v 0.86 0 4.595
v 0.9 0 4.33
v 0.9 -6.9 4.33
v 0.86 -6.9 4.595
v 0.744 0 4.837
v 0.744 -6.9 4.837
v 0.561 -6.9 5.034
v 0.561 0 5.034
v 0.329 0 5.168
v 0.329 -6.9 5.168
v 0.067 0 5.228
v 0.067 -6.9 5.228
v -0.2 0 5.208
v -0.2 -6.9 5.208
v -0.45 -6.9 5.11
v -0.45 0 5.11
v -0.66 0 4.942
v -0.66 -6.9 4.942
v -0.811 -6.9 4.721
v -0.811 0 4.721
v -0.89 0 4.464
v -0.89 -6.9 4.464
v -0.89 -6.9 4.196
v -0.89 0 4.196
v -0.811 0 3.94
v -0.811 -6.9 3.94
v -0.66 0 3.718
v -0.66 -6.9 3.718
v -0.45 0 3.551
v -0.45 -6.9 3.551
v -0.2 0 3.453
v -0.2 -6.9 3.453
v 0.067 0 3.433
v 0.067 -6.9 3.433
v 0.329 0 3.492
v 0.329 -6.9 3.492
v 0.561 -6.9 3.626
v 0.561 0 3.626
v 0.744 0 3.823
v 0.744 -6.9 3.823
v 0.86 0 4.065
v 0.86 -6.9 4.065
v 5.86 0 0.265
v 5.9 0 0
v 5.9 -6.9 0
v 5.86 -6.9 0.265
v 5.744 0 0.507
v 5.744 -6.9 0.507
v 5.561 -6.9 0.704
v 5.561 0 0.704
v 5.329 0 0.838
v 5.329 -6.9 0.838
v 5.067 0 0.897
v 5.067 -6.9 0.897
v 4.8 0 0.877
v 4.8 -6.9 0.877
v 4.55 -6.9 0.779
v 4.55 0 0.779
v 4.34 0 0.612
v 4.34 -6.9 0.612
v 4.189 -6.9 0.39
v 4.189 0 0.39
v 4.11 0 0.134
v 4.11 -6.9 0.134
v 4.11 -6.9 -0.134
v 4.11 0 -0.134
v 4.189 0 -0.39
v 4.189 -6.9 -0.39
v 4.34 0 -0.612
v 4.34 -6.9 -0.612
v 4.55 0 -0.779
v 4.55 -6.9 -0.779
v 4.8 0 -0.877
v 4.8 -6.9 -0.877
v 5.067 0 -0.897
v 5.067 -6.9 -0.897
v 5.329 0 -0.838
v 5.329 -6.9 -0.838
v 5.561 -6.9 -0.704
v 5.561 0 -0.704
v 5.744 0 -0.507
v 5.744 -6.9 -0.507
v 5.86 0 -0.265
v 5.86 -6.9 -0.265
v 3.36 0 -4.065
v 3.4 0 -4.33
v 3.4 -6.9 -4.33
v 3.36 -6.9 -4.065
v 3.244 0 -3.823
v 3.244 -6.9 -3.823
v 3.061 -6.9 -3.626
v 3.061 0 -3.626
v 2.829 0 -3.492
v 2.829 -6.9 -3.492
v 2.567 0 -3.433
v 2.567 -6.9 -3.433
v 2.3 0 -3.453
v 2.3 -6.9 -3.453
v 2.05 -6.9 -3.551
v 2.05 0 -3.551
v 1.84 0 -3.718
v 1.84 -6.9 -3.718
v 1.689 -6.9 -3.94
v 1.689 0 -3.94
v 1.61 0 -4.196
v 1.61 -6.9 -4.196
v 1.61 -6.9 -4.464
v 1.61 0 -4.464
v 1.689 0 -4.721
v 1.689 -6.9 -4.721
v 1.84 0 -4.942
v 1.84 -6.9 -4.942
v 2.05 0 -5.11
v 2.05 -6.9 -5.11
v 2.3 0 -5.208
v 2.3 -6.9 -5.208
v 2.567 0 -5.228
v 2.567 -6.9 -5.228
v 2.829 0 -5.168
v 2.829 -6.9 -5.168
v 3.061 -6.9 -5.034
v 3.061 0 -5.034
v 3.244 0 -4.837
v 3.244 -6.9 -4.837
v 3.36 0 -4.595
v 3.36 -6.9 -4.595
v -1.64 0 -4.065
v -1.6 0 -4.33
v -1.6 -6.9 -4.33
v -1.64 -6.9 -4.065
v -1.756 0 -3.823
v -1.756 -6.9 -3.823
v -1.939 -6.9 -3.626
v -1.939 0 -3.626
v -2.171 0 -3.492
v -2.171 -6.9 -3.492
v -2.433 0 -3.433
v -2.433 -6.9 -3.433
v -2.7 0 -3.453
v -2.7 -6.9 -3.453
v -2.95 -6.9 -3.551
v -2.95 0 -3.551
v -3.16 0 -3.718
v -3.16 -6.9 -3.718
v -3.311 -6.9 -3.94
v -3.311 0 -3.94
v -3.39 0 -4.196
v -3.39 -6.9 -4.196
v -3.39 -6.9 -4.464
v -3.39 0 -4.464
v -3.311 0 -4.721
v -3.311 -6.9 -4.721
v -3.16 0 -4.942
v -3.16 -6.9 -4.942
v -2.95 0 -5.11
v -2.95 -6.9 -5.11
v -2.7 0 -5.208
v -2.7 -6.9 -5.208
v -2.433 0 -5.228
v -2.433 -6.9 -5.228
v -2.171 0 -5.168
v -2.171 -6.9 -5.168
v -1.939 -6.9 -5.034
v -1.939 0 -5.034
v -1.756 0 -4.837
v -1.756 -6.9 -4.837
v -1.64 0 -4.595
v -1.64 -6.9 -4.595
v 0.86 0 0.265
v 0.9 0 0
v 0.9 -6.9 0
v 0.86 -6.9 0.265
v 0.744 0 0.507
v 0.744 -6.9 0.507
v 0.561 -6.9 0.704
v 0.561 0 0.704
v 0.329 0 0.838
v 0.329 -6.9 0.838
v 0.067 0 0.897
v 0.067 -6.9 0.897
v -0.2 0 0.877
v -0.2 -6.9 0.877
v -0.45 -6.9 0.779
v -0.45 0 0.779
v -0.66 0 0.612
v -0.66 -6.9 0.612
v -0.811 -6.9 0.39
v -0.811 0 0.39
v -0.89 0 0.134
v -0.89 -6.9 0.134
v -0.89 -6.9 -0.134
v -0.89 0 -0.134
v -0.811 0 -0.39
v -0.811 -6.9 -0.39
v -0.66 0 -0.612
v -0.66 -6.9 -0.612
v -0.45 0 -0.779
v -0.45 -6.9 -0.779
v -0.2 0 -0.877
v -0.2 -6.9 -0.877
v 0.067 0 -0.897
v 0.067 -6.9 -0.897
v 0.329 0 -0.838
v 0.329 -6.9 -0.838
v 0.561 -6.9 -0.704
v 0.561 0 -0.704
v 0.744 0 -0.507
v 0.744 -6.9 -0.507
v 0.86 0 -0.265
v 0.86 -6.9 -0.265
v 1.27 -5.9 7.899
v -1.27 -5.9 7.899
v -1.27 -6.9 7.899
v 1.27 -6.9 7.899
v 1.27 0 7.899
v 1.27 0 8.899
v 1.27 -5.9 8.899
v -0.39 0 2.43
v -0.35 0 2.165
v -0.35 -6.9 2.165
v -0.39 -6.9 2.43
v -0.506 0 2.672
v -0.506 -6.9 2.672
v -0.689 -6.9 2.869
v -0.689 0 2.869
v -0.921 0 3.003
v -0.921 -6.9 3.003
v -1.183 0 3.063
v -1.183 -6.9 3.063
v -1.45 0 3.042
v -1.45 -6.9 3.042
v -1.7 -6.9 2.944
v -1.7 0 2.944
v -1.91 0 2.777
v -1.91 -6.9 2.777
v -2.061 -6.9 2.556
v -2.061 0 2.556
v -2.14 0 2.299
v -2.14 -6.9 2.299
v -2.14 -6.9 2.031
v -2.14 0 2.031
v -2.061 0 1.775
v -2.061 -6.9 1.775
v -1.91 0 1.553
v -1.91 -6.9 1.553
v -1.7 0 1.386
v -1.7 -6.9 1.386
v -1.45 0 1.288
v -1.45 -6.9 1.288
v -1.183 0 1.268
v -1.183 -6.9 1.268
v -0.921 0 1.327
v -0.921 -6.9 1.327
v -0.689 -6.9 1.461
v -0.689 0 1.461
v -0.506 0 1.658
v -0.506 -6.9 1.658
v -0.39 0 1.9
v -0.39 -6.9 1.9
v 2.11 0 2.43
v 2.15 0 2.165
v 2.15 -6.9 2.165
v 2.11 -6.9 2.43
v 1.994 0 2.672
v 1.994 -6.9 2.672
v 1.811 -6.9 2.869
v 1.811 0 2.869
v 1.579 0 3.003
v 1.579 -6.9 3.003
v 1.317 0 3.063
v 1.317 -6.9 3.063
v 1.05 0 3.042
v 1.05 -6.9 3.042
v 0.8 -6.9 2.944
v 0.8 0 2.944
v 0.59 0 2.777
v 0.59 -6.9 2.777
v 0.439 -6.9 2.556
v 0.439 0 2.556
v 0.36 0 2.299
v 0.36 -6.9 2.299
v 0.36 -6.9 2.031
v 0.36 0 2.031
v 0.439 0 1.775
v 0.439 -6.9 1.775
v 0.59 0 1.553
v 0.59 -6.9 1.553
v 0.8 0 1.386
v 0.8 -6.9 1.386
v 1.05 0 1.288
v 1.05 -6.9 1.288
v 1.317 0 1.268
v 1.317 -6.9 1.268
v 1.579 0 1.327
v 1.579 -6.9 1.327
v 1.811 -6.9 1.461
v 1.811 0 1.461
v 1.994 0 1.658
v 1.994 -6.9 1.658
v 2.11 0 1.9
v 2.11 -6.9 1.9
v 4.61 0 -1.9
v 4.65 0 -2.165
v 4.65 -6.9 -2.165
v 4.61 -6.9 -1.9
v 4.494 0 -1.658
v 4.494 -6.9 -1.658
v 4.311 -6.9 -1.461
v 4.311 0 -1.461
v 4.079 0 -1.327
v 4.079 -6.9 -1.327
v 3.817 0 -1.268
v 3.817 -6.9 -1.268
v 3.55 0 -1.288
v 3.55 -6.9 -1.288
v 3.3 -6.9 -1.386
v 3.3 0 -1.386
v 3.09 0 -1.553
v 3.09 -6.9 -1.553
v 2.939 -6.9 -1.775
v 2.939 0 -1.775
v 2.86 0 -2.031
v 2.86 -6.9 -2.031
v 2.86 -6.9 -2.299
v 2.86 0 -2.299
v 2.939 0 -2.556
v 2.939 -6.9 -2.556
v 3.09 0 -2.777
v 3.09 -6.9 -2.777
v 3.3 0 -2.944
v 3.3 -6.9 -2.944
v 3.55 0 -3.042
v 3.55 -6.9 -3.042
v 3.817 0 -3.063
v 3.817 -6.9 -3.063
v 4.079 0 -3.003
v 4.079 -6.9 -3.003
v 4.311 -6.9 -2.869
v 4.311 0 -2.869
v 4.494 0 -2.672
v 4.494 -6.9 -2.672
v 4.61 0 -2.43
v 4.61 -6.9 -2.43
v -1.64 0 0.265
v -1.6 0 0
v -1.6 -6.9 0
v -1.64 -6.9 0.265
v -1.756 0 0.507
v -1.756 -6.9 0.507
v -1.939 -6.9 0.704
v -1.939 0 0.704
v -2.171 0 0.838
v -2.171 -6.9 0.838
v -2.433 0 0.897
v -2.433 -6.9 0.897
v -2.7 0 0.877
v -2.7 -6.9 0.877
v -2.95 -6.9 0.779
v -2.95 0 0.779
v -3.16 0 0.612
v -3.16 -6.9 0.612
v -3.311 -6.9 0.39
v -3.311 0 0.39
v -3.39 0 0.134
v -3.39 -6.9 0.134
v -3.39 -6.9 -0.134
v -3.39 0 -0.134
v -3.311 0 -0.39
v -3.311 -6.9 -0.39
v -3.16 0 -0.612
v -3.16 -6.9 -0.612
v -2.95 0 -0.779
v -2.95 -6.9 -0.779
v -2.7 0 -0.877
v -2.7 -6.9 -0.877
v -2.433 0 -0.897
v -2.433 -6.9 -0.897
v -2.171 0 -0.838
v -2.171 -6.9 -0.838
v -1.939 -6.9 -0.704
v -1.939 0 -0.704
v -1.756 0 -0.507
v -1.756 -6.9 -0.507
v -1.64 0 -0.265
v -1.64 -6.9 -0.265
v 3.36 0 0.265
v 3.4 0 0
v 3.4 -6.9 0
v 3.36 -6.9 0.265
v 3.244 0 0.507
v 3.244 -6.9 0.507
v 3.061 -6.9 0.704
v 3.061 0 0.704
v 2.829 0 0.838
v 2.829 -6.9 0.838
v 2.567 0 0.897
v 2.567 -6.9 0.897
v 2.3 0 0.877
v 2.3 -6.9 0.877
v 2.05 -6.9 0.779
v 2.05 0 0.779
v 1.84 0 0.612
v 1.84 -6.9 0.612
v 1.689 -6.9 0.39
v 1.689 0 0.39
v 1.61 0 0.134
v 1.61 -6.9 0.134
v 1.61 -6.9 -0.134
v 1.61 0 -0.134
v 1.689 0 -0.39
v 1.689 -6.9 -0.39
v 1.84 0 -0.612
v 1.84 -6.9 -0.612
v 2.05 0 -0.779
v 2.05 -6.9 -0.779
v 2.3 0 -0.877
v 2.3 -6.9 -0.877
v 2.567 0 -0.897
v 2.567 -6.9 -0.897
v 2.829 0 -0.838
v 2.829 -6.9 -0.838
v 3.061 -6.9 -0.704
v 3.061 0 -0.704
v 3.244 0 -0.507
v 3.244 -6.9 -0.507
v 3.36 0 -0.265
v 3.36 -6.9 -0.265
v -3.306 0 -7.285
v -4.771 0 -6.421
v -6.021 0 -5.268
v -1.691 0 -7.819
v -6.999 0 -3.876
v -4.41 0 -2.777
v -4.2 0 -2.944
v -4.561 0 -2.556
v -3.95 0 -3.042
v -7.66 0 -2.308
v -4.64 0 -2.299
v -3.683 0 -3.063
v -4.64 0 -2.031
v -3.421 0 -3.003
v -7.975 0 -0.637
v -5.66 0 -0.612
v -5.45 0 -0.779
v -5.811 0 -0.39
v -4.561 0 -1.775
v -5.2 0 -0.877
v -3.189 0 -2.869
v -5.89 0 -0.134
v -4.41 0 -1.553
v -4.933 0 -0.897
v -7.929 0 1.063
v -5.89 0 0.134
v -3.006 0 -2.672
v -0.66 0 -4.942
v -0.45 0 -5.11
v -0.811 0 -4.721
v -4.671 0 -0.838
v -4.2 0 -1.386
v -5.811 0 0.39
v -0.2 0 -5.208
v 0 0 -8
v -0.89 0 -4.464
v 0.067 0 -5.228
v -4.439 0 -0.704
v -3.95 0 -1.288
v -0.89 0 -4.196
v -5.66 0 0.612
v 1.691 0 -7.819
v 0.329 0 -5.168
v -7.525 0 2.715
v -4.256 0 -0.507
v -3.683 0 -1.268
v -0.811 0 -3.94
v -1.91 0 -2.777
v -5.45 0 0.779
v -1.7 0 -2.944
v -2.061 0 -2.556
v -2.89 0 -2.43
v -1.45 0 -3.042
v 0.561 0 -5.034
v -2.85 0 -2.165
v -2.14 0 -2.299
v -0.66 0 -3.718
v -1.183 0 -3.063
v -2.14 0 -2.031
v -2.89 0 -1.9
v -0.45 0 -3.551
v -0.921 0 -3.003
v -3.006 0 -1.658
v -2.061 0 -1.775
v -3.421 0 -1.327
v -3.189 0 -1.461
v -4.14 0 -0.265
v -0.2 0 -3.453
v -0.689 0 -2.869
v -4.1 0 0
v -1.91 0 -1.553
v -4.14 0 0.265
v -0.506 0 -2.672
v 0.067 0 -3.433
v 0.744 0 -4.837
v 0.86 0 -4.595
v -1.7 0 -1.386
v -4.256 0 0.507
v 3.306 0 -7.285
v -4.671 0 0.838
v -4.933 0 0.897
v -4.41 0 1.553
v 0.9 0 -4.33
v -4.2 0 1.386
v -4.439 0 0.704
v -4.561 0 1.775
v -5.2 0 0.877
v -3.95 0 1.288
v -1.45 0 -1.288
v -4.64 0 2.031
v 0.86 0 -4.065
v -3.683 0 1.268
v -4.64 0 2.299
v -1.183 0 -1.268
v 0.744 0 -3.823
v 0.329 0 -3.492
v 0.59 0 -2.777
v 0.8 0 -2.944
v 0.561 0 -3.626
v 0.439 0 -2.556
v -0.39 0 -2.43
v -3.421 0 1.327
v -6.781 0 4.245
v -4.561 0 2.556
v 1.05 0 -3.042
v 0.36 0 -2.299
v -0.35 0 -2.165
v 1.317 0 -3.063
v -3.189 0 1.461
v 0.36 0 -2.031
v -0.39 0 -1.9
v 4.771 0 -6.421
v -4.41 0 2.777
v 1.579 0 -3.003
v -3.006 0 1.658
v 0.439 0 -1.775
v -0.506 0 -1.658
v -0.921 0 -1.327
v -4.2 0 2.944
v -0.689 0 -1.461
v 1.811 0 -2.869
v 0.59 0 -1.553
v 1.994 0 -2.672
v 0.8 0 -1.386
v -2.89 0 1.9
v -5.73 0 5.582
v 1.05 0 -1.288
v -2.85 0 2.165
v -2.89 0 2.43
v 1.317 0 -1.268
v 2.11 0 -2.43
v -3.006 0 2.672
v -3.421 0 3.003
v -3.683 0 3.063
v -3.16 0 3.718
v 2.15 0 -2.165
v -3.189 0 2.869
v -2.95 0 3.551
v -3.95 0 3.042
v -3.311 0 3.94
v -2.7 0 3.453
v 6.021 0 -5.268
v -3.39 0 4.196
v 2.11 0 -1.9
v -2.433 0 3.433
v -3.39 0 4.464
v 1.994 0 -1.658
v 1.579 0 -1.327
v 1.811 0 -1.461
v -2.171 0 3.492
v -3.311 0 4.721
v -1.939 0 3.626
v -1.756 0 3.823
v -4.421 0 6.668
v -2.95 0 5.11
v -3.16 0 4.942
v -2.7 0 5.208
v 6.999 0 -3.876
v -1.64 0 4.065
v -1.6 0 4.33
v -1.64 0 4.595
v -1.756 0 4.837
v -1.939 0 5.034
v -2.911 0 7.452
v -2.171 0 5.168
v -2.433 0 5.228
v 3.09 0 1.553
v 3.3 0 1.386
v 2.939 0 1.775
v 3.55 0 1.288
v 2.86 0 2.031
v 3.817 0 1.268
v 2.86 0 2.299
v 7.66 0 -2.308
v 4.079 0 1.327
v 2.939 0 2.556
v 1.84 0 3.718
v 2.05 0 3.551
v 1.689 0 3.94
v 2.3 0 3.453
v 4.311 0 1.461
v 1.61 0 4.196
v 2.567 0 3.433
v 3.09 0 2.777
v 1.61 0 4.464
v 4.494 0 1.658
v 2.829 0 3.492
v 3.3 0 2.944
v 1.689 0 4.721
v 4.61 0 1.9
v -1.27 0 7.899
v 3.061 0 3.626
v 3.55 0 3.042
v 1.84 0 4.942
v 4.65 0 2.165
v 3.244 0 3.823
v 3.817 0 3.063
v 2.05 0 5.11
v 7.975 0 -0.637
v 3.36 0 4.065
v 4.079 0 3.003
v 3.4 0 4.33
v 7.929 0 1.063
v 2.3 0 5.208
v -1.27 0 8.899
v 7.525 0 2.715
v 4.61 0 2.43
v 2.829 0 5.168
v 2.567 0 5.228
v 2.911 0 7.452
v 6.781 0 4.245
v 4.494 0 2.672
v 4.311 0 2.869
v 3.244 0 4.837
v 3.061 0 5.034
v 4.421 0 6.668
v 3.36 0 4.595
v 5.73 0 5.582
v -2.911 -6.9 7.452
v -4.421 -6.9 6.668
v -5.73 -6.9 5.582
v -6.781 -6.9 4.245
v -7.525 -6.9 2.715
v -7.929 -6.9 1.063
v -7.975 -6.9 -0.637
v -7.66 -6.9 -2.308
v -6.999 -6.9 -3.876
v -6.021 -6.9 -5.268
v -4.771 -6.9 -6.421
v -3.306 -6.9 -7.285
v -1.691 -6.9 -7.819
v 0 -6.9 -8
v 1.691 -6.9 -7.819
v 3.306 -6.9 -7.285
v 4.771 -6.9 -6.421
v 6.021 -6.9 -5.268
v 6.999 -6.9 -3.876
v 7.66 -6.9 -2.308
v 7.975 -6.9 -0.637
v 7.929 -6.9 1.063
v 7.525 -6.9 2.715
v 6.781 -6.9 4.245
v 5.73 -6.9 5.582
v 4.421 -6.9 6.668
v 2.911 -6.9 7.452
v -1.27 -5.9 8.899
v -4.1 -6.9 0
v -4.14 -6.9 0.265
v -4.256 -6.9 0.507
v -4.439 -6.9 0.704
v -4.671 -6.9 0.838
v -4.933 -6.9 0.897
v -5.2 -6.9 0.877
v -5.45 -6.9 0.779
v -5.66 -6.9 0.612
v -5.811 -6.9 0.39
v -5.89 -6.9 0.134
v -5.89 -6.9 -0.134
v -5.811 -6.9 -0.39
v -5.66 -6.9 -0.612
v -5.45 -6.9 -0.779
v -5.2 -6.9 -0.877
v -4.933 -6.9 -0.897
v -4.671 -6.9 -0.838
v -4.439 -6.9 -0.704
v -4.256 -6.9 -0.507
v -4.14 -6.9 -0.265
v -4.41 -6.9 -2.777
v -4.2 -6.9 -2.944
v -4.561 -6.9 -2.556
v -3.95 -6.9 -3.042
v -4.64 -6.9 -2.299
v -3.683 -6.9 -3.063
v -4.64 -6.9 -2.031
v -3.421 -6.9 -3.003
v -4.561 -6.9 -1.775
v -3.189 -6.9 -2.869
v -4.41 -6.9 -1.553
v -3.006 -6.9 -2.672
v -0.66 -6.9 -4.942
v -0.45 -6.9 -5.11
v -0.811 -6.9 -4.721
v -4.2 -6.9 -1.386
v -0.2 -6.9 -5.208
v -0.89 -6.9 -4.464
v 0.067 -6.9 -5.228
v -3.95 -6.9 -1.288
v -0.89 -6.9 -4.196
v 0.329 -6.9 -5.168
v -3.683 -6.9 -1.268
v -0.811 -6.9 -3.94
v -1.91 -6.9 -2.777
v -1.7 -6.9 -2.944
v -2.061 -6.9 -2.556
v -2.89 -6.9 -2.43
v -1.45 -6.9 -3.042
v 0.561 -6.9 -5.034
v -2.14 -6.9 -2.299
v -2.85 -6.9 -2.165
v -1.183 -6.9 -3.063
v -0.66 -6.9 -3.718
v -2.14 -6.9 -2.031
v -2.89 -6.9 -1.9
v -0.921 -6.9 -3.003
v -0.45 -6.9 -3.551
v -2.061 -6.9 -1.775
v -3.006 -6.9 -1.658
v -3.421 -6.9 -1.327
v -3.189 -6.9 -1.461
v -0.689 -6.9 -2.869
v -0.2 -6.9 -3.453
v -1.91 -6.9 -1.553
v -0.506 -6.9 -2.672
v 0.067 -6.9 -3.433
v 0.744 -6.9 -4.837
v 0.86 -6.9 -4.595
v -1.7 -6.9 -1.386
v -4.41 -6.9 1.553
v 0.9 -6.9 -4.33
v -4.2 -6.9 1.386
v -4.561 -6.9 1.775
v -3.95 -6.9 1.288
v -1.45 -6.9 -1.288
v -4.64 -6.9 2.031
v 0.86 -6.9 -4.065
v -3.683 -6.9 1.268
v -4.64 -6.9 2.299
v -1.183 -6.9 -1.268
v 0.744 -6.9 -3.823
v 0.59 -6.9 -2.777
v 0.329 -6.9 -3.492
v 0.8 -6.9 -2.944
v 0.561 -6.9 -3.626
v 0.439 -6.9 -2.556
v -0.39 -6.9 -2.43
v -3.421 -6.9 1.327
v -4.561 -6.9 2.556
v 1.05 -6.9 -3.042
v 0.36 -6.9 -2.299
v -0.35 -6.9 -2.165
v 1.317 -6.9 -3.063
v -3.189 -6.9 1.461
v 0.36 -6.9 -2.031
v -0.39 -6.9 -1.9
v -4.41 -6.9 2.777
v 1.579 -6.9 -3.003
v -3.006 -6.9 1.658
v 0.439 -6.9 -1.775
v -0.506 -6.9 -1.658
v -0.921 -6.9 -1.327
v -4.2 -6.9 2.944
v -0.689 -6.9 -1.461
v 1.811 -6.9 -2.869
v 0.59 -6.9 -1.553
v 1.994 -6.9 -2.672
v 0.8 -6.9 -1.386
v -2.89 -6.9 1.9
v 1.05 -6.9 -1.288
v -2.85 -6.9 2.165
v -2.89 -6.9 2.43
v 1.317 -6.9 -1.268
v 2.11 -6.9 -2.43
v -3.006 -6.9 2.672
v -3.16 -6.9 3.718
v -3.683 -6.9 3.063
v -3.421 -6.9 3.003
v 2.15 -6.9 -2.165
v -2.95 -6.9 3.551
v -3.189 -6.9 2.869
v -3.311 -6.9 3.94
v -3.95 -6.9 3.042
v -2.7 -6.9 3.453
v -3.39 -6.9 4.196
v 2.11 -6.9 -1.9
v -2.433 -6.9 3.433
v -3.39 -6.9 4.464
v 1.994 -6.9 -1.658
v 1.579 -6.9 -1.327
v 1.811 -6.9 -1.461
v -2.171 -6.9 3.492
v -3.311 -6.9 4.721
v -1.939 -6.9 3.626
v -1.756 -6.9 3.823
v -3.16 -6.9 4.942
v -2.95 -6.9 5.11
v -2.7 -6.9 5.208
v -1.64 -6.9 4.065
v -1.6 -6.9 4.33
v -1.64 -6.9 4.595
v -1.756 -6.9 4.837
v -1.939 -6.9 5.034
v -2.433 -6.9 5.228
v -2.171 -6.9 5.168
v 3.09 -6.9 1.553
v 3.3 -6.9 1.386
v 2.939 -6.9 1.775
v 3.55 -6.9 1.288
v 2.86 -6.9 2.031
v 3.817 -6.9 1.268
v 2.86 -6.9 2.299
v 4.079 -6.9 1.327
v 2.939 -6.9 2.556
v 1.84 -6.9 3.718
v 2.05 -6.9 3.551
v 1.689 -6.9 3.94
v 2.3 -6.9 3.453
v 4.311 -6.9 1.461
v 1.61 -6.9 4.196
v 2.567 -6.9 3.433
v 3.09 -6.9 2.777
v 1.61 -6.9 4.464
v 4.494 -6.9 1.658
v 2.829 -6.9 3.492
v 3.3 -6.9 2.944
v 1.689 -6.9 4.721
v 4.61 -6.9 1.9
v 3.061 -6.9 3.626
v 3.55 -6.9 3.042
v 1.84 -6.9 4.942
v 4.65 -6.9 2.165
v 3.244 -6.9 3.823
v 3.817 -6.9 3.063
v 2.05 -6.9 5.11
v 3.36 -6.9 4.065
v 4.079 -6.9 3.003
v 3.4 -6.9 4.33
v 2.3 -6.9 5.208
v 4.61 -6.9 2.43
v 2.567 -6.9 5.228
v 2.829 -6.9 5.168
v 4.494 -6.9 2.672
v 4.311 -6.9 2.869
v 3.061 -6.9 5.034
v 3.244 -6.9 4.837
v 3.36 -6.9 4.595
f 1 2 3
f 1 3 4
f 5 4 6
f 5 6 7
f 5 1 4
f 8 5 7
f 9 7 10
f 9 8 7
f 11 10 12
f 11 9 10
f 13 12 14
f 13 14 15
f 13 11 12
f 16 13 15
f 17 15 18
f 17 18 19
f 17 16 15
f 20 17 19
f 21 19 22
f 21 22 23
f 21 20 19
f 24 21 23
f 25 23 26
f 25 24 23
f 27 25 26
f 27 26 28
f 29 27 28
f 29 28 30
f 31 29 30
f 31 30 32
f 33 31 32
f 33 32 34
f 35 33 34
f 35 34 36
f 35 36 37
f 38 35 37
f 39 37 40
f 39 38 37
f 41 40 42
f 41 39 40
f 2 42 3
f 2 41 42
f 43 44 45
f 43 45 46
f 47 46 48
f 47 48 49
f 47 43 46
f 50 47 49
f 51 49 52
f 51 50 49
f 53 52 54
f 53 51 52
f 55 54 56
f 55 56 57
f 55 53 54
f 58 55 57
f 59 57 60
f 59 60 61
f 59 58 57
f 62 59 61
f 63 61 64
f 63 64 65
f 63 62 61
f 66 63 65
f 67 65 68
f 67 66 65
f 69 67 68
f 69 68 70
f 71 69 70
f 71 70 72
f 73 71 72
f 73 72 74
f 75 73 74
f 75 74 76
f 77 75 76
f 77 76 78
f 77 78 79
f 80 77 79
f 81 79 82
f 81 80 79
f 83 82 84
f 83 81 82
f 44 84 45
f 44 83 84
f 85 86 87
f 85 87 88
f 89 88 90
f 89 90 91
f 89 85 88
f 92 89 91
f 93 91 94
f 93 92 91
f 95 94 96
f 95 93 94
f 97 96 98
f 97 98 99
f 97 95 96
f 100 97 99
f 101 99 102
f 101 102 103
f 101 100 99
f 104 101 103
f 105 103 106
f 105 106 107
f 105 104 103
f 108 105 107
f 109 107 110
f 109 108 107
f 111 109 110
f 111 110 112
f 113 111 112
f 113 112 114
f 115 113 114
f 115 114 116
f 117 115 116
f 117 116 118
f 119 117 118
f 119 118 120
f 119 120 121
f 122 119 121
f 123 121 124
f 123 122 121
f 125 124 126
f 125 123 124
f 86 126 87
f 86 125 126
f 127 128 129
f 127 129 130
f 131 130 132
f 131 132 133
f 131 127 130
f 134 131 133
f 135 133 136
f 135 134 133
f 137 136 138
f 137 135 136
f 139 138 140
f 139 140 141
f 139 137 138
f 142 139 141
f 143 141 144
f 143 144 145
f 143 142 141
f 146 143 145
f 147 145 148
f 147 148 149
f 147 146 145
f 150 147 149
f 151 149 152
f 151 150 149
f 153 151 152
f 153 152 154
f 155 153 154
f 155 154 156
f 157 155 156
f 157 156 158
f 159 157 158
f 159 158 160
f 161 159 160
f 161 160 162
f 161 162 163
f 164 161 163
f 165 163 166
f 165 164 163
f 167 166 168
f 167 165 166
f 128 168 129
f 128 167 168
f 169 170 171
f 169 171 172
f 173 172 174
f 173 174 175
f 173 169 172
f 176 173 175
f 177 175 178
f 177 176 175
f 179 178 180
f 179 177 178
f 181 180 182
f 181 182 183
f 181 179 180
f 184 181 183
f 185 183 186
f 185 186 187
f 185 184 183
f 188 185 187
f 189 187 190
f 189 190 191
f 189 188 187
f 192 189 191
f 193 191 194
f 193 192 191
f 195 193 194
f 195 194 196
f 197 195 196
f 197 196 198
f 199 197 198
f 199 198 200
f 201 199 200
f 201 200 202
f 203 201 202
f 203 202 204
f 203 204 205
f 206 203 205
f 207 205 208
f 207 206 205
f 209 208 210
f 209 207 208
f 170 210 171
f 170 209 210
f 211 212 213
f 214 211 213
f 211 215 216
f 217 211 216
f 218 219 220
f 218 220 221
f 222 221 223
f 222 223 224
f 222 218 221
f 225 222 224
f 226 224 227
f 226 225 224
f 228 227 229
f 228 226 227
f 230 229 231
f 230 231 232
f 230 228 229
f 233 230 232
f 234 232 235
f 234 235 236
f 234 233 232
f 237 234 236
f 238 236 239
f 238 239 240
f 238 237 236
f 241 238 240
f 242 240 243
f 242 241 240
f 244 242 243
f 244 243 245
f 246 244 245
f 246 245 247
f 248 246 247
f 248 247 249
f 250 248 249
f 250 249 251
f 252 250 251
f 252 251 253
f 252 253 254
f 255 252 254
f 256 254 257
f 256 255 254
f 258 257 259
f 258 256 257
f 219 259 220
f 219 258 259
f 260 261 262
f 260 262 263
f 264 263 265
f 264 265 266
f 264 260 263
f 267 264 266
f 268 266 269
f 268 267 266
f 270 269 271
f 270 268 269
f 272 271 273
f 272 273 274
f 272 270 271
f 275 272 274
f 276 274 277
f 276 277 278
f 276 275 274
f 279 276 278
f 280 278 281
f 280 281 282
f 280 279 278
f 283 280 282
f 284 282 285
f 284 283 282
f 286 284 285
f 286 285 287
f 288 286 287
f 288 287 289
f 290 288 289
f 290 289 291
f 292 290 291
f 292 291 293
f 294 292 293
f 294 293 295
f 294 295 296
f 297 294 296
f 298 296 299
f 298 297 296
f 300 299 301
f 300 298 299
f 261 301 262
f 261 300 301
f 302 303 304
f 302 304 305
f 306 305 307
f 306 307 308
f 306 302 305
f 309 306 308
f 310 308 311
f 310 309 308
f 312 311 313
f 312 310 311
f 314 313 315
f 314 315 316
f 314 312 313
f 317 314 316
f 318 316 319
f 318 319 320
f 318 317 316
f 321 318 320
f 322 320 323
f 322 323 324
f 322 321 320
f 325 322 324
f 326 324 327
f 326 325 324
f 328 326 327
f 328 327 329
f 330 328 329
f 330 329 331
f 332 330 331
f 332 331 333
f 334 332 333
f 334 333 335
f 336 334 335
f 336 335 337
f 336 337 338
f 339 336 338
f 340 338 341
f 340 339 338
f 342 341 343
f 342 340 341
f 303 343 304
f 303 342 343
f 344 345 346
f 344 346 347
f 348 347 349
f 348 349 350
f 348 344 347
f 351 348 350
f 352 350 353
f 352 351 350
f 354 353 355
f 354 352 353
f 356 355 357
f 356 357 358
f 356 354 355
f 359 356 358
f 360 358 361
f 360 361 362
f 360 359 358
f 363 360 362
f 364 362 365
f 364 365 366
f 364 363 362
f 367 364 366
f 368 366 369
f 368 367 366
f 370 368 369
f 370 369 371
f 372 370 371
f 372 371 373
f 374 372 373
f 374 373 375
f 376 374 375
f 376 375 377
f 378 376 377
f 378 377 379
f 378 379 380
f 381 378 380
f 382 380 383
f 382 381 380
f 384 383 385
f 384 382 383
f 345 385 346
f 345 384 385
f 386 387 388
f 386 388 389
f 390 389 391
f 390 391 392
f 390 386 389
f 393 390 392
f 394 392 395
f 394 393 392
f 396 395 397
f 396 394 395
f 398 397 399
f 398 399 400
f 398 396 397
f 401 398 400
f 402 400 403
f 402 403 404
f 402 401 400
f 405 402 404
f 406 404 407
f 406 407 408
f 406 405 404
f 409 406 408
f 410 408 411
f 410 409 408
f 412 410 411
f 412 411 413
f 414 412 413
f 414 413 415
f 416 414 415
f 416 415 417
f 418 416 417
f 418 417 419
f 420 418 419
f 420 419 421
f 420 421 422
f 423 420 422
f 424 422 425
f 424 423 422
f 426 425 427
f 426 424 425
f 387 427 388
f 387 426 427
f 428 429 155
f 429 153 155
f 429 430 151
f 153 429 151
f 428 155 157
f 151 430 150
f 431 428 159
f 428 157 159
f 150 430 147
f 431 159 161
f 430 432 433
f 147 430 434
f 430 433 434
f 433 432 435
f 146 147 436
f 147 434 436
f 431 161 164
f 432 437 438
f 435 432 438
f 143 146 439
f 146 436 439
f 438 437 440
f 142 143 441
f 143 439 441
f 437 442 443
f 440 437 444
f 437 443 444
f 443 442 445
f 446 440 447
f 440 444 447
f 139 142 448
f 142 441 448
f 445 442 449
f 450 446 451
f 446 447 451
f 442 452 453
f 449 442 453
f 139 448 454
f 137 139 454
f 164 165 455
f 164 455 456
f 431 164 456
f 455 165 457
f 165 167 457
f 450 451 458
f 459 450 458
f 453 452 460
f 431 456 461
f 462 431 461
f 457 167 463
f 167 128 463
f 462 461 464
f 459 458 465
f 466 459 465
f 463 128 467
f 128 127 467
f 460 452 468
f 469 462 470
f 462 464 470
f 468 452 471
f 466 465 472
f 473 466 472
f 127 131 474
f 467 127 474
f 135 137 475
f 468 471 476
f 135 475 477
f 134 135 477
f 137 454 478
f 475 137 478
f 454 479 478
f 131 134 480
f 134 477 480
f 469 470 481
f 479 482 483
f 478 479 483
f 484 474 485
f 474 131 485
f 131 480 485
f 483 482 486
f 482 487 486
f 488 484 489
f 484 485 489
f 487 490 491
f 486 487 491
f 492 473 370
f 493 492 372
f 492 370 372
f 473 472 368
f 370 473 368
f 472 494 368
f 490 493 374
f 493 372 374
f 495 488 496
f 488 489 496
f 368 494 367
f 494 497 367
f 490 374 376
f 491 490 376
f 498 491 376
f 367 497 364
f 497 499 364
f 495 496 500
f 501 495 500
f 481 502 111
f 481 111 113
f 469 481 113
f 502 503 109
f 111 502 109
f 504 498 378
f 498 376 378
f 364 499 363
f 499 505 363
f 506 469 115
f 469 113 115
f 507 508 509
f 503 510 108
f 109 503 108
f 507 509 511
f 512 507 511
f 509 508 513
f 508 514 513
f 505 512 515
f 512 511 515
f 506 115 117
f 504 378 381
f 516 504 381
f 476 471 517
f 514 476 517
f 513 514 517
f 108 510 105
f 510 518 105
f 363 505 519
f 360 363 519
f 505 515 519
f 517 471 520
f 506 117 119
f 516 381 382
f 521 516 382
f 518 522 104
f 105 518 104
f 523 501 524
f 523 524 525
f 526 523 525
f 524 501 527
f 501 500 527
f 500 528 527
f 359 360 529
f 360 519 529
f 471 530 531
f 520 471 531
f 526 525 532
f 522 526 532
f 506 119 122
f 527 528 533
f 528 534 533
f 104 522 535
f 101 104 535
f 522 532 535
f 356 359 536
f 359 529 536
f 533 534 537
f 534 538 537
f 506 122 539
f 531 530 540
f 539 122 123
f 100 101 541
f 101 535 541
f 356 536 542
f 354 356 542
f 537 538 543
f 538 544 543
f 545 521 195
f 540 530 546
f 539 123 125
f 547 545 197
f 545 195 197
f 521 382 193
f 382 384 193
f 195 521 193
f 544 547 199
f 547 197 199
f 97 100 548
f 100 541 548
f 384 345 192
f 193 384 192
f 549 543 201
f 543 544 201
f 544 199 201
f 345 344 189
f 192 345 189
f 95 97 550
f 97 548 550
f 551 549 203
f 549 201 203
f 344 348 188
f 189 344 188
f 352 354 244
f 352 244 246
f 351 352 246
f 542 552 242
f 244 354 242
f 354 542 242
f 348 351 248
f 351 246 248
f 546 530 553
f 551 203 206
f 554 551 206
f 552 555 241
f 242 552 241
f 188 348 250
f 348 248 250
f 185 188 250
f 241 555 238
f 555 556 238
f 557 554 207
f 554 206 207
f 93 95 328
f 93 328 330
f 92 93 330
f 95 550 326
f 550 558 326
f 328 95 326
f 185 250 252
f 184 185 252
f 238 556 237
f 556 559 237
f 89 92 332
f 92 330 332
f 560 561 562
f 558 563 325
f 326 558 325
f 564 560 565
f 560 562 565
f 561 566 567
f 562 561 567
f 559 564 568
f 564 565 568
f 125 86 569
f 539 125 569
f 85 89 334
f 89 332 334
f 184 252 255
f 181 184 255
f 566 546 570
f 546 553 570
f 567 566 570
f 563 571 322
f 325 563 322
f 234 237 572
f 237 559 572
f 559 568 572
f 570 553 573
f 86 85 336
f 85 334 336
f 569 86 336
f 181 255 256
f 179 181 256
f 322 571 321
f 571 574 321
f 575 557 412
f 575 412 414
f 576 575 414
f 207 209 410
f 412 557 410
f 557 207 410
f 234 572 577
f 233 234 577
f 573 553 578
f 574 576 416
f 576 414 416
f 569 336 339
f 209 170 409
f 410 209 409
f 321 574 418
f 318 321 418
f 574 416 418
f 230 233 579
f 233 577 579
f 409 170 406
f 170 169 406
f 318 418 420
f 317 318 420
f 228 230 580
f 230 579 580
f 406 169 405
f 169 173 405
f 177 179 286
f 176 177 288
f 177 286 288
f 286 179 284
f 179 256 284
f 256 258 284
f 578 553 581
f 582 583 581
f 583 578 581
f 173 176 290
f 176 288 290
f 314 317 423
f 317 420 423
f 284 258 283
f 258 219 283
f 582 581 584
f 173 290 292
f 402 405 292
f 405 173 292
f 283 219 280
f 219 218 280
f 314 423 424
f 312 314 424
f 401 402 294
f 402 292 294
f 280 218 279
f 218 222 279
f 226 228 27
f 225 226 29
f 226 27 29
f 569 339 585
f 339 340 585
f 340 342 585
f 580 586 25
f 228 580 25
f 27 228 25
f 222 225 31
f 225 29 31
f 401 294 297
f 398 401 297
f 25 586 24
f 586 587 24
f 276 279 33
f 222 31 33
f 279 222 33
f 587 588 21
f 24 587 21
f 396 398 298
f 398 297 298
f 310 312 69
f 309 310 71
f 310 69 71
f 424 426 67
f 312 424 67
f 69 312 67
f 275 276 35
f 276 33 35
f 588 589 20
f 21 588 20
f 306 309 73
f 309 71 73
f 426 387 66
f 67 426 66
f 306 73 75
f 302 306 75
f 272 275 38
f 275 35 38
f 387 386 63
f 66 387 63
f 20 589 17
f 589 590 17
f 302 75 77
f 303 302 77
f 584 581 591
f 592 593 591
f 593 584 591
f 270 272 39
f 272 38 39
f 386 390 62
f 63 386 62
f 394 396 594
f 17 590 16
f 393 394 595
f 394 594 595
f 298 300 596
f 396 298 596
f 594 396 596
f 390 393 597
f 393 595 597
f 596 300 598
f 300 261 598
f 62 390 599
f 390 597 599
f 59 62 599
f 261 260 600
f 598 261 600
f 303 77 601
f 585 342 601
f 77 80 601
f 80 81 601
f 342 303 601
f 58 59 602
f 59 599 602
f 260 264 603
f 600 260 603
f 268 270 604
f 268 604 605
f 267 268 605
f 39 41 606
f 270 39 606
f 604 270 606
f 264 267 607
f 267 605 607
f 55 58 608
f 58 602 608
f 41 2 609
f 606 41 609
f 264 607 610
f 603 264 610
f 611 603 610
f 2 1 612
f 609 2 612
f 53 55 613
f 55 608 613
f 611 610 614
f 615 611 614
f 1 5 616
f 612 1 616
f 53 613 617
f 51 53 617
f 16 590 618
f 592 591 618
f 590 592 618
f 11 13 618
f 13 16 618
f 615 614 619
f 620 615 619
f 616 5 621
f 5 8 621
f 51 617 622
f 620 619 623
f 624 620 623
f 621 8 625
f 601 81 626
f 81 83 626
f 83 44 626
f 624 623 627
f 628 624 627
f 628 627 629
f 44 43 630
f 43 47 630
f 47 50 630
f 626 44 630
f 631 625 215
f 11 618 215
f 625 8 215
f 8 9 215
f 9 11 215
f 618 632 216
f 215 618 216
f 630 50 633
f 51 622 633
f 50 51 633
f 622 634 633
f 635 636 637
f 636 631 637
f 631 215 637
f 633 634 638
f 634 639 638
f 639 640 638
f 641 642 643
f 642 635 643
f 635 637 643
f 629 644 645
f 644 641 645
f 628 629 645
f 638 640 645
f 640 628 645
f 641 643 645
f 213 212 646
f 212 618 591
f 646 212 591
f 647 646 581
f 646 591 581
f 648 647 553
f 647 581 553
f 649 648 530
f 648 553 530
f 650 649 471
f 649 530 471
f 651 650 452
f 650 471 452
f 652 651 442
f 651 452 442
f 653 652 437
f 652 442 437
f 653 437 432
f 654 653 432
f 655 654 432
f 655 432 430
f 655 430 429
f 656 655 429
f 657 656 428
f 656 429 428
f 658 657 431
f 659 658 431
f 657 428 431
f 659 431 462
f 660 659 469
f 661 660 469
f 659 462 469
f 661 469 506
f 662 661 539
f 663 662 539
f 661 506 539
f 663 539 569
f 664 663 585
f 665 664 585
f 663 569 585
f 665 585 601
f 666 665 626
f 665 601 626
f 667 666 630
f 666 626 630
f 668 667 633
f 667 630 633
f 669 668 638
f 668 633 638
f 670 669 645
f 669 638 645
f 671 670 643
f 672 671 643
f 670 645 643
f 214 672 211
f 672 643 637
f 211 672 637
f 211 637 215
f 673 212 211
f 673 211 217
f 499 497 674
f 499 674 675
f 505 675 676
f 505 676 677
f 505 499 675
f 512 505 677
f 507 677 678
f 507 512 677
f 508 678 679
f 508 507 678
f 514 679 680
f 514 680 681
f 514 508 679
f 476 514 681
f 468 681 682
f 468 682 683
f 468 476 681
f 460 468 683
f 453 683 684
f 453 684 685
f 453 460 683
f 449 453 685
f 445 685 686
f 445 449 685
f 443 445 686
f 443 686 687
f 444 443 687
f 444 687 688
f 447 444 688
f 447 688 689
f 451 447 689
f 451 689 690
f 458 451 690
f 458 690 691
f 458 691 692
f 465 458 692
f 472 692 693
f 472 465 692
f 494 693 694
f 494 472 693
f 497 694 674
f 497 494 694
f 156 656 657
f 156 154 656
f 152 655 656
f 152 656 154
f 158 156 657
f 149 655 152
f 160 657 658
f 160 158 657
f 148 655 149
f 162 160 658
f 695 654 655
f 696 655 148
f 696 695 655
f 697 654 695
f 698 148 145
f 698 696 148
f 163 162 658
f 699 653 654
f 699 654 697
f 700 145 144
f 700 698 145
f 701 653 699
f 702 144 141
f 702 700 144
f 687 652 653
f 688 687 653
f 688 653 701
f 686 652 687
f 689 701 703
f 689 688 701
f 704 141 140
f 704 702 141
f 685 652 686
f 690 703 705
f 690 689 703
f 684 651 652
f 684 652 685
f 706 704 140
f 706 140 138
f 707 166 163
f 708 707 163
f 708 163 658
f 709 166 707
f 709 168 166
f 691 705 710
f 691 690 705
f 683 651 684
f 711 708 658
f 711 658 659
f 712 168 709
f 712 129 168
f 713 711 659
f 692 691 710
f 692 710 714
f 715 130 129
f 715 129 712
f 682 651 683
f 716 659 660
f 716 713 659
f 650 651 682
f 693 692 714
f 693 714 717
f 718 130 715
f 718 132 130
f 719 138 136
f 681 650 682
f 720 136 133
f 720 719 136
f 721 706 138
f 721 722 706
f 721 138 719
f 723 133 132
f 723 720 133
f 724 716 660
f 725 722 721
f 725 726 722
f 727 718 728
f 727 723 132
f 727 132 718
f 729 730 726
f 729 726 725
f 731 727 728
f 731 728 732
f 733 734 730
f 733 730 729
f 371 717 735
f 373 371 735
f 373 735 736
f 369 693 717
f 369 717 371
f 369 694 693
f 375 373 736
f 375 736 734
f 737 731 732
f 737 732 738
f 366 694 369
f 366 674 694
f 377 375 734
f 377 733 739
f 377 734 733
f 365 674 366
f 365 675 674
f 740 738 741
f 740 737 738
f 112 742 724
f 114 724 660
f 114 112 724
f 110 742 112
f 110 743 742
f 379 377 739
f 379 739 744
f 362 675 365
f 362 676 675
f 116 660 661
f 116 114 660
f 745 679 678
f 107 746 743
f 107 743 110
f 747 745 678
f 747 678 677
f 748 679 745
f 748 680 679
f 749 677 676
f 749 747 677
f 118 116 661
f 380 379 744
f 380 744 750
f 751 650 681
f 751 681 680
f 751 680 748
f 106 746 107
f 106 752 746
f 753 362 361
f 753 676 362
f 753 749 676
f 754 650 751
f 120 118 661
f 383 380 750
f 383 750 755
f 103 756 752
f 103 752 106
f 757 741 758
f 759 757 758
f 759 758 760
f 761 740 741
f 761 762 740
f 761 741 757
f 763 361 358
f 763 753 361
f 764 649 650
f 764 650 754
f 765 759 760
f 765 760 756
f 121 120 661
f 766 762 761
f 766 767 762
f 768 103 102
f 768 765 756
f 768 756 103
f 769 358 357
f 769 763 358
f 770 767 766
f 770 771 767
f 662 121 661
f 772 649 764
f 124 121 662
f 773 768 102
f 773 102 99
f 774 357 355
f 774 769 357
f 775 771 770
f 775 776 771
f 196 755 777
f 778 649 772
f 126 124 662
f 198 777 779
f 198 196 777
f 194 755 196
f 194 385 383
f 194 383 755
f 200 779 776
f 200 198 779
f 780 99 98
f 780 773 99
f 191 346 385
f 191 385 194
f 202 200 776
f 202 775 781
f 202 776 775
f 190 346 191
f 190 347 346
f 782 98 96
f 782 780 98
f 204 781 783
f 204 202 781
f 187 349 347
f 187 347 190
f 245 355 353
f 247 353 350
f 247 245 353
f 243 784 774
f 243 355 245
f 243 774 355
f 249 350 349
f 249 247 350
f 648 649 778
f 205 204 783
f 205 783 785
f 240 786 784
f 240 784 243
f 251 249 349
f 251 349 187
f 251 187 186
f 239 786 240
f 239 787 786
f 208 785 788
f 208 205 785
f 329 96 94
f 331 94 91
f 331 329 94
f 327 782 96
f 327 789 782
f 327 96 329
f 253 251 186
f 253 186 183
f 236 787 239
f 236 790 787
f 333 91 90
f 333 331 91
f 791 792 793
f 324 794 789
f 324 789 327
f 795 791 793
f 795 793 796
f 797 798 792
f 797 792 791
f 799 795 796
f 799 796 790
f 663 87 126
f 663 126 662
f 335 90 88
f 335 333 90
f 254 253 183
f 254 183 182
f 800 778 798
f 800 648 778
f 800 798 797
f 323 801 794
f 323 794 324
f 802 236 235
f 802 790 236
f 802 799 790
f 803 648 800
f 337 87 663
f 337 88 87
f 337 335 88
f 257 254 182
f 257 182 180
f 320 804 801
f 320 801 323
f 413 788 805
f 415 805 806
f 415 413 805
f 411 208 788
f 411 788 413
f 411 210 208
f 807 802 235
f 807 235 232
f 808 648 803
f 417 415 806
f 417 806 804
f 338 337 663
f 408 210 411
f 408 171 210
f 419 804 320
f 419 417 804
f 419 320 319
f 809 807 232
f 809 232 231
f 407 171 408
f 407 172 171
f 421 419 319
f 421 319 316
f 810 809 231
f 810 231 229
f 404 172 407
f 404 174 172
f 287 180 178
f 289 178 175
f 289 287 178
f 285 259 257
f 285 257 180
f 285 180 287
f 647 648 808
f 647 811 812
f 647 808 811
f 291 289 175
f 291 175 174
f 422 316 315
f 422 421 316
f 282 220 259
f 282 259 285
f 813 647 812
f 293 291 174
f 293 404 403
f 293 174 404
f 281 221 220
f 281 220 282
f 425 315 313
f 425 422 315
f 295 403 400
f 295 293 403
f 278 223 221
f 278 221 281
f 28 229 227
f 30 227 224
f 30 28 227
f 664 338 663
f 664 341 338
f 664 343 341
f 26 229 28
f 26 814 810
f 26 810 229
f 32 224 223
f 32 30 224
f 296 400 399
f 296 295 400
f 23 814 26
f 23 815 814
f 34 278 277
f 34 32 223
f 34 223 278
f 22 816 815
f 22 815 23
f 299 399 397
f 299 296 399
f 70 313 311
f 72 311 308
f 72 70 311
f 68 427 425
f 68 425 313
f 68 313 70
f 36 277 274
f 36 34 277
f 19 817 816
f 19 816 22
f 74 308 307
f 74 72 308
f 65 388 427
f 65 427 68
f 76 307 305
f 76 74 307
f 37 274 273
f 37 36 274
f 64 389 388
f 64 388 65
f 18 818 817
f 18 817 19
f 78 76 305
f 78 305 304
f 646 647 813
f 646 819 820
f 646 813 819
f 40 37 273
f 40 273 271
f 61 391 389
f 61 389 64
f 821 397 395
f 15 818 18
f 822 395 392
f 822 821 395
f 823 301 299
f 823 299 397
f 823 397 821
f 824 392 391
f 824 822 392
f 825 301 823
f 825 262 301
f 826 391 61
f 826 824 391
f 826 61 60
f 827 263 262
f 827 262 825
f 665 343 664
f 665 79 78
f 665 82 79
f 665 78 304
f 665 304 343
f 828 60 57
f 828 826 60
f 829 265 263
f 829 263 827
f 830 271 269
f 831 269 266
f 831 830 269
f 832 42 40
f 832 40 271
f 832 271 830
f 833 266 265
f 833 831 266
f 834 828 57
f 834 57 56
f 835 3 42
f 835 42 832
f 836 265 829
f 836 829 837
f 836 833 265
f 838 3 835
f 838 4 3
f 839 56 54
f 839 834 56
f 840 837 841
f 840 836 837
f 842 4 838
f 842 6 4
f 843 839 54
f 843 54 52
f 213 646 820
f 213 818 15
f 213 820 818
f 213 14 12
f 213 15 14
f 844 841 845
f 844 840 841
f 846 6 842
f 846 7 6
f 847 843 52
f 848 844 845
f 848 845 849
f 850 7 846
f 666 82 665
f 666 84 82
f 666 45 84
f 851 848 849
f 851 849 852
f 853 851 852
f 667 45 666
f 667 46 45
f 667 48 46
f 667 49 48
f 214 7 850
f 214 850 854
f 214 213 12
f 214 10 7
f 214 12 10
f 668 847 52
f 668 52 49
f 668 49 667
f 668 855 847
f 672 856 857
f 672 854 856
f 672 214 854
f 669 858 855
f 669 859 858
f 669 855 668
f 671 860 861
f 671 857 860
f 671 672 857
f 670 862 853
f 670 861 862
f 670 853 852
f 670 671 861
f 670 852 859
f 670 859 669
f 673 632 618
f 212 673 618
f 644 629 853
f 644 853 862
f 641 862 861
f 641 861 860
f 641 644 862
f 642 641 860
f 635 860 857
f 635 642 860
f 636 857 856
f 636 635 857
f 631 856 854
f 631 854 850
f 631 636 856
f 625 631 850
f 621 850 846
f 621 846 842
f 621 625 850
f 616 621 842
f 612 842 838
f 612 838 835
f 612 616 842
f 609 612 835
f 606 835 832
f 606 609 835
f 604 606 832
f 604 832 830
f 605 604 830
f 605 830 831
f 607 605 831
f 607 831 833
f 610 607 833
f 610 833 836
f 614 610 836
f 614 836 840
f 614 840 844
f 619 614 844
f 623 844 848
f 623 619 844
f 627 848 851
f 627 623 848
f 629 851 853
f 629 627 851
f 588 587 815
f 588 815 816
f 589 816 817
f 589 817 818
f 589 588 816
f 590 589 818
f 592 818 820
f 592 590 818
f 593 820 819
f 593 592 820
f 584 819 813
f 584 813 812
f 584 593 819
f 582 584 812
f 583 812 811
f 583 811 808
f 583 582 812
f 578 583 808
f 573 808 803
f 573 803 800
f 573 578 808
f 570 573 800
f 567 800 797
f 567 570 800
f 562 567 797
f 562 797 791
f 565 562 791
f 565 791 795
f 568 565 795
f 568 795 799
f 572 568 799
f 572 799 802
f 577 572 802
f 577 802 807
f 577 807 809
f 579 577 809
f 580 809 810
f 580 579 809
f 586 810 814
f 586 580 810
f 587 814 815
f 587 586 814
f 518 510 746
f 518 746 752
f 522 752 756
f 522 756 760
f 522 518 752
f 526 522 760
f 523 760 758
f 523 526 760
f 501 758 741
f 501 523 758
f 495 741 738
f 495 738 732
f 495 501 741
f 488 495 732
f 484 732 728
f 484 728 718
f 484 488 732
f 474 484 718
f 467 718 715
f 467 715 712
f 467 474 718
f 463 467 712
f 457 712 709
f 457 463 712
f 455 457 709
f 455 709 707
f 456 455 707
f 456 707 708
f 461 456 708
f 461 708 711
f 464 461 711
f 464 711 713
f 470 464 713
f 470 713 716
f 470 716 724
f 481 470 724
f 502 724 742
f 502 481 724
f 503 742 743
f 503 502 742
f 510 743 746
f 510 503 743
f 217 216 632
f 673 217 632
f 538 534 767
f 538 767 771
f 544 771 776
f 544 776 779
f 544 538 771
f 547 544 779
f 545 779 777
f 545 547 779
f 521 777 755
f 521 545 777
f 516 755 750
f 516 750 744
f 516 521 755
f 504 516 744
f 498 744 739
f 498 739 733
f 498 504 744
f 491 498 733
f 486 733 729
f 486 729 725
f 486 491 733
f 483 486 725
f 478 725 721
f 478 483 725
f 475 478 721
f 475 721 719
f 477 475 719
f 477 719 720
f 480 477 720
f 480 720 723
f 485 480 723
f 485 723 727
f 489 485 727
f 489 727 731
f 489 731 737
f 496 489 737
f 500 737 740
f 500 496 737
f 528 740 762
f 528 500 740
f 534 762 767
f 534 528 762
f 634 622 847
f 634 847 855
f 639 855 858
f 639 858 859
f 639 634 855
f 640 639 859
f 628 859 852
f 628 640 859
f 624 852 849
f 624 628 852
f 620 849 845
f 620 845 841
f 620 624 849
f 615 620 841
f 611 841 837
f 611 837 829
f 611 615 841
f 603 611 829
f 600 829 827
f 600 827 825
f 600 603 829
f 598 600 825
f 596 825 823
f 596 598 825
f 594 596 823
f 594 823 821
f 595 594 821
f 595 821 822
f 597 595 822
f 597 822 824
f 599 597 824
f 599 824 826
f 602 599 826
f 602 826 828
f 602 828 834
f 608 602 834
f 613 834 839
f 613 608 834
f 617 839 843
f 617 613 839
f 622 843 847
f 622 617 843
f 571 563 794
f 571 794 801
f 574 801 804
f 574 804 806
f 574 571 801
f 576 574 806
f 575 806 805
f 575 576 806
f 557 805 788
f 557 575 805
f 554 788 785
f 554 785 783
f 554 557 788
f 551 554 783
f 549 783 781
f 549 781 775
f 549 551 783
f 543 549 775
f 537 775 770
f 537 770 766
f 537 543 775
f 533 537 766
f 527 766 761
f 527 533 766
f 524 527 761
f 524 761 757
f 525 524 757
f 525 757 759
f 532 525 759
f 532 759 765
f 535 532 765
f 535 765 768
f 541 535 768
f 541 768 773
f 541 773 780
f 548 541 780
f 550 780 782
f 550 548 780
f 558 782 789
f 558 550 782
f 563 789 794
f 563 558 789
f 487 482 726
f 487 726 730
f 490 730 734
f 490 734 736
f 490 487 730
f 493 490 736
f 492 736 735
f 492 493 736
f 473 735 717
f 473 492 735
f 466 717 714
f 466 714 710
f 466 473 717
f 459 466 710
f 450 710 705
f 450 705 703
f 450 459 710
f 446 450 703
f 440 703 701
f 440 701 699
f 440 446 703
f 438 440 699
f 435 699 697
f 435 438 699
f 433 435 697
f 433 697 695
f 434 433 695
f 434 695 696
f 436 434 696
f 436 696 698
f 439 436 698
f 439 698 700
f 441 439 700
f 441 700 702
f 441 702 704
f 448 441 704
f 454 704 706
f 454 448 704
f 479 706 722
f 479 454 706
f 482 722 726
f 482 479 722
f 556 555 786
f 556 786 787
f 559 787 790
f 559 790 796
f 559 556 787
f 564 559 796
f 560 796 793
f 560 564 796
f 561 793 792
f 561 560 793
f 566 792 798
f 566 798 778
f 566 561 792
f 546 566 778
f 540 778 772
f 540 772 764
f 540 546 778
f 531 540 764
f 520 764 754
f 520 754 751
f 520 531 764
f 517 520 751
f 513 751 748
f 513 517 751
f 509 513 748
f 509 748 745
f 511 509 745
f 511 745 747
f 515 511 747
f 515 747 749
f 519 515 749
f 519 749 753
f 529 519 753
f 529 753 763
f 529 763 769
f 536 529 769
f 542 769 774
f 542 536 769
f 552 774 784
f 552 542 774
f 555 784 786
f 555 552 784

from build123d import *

# Parameters (mm, degrees)
F0_R     = 0.9
F1_DEPTH = 6.9
F2_W     = 1
F2_H     = 1
F3_DEPTH = 2.54


with BuildPart() as f1:
    # F0 (on Front) → F1 (new body)
    with BuildSketch(Plane.XZ):
        with BuildLine():
            Line((-1.27, 8.89855), (-1.27, 7.89855))
            ThreePointArc((-1.27, 7.89855), (0, -8), (1.27, 7.89855))
            Line((1.27, 7.89855), (1.27, 8.89855))
            Line((1.27, 8.89855), (-1.27, 8.89855))
        make_face()
        with Locations((-2.5, -4.330127)):
            Circle(F0_R, mode=Mode.SUBTRACT)
        with Locations((-5, 0)):
            Circle(F0_R, mode=Mode.SUBTRACT)
        with Locations((-3.75, -2.165064)):
            Circle(F0_R, mode=Mode.SUBTRACT)
        with Locations((-1.25, -2.165064)):
            Circle(F0_R, mode=Mode.SUBTRACT)
        with Locations((-2.5, 0)):
            Circle(F0_R, mode=Mode.SUBTRACT)
        with Locations((0, -4.330127)):
            Circle(F0_R, mode=Mode.SUBTRACT)
        with Locations((2.5, -4.330127)):
            Circle(F0_R, mode=Mode.SUBTRACT)
        with Locations((1.25, -2.165064)):
            Circle(F0_R, mode=Mode.SUBTRACT)
        with Locations((3.75, -2.165064)):
            Circle(F0_R, mode=Mode.SUBTRACT)
        Circle(F0_R, mode=Mode.SUBTRACT)
        with Locations((2.5, 0)):
            Circle(F0_R, mode=Mode.SUBTRACT)
        with Locations((5, 0)):
            Circle(F0_R, mode=Mode.SUBTRACT)
        with Locations((-3.75, 2.165064)):
            Circle(F0_R, mode=Mode.SUBTRACT)
        with Locations((-1.25, 2.165064)):
            Circle(F0_R, mode=Mode.SUBTRACT)
        with Locations((-2.5, 4.330127)):
            Circle(F0_R, mode=Mode.SUBTRACT)
        with Locations((1.25, 2.165064)):
            Circle(F0_R, mode=Mode.SUBTRACT)
        with Locations((3.75, 2.165064)):
            Circle(F0_R, mode=Mode.SUBTRACT)
        with Locations((0, 4.330127)):
            Circle(F0_R, mode=Mode.SUBTRACT)
        with Locations((2.5, 4.330127)):
            Circle(F0_R, mode=Mode.SUBTRACT)
    extrude(amount=F1_DEPTH)

    # F2 (on face) → F3 (cut)
    with BuildSketch(Plane(origin=(-1.27, 0, 0), x_dir=(0, -1, 0), z_dir=(-1, 0, 0))):
        with Locations((6.4, 8.39855)):
            Rectangle(F2_W, F2_H)
    extrude(amount=-F3_DEPTH, mode=Mode.SUBTRACT)


solid = f1.part
